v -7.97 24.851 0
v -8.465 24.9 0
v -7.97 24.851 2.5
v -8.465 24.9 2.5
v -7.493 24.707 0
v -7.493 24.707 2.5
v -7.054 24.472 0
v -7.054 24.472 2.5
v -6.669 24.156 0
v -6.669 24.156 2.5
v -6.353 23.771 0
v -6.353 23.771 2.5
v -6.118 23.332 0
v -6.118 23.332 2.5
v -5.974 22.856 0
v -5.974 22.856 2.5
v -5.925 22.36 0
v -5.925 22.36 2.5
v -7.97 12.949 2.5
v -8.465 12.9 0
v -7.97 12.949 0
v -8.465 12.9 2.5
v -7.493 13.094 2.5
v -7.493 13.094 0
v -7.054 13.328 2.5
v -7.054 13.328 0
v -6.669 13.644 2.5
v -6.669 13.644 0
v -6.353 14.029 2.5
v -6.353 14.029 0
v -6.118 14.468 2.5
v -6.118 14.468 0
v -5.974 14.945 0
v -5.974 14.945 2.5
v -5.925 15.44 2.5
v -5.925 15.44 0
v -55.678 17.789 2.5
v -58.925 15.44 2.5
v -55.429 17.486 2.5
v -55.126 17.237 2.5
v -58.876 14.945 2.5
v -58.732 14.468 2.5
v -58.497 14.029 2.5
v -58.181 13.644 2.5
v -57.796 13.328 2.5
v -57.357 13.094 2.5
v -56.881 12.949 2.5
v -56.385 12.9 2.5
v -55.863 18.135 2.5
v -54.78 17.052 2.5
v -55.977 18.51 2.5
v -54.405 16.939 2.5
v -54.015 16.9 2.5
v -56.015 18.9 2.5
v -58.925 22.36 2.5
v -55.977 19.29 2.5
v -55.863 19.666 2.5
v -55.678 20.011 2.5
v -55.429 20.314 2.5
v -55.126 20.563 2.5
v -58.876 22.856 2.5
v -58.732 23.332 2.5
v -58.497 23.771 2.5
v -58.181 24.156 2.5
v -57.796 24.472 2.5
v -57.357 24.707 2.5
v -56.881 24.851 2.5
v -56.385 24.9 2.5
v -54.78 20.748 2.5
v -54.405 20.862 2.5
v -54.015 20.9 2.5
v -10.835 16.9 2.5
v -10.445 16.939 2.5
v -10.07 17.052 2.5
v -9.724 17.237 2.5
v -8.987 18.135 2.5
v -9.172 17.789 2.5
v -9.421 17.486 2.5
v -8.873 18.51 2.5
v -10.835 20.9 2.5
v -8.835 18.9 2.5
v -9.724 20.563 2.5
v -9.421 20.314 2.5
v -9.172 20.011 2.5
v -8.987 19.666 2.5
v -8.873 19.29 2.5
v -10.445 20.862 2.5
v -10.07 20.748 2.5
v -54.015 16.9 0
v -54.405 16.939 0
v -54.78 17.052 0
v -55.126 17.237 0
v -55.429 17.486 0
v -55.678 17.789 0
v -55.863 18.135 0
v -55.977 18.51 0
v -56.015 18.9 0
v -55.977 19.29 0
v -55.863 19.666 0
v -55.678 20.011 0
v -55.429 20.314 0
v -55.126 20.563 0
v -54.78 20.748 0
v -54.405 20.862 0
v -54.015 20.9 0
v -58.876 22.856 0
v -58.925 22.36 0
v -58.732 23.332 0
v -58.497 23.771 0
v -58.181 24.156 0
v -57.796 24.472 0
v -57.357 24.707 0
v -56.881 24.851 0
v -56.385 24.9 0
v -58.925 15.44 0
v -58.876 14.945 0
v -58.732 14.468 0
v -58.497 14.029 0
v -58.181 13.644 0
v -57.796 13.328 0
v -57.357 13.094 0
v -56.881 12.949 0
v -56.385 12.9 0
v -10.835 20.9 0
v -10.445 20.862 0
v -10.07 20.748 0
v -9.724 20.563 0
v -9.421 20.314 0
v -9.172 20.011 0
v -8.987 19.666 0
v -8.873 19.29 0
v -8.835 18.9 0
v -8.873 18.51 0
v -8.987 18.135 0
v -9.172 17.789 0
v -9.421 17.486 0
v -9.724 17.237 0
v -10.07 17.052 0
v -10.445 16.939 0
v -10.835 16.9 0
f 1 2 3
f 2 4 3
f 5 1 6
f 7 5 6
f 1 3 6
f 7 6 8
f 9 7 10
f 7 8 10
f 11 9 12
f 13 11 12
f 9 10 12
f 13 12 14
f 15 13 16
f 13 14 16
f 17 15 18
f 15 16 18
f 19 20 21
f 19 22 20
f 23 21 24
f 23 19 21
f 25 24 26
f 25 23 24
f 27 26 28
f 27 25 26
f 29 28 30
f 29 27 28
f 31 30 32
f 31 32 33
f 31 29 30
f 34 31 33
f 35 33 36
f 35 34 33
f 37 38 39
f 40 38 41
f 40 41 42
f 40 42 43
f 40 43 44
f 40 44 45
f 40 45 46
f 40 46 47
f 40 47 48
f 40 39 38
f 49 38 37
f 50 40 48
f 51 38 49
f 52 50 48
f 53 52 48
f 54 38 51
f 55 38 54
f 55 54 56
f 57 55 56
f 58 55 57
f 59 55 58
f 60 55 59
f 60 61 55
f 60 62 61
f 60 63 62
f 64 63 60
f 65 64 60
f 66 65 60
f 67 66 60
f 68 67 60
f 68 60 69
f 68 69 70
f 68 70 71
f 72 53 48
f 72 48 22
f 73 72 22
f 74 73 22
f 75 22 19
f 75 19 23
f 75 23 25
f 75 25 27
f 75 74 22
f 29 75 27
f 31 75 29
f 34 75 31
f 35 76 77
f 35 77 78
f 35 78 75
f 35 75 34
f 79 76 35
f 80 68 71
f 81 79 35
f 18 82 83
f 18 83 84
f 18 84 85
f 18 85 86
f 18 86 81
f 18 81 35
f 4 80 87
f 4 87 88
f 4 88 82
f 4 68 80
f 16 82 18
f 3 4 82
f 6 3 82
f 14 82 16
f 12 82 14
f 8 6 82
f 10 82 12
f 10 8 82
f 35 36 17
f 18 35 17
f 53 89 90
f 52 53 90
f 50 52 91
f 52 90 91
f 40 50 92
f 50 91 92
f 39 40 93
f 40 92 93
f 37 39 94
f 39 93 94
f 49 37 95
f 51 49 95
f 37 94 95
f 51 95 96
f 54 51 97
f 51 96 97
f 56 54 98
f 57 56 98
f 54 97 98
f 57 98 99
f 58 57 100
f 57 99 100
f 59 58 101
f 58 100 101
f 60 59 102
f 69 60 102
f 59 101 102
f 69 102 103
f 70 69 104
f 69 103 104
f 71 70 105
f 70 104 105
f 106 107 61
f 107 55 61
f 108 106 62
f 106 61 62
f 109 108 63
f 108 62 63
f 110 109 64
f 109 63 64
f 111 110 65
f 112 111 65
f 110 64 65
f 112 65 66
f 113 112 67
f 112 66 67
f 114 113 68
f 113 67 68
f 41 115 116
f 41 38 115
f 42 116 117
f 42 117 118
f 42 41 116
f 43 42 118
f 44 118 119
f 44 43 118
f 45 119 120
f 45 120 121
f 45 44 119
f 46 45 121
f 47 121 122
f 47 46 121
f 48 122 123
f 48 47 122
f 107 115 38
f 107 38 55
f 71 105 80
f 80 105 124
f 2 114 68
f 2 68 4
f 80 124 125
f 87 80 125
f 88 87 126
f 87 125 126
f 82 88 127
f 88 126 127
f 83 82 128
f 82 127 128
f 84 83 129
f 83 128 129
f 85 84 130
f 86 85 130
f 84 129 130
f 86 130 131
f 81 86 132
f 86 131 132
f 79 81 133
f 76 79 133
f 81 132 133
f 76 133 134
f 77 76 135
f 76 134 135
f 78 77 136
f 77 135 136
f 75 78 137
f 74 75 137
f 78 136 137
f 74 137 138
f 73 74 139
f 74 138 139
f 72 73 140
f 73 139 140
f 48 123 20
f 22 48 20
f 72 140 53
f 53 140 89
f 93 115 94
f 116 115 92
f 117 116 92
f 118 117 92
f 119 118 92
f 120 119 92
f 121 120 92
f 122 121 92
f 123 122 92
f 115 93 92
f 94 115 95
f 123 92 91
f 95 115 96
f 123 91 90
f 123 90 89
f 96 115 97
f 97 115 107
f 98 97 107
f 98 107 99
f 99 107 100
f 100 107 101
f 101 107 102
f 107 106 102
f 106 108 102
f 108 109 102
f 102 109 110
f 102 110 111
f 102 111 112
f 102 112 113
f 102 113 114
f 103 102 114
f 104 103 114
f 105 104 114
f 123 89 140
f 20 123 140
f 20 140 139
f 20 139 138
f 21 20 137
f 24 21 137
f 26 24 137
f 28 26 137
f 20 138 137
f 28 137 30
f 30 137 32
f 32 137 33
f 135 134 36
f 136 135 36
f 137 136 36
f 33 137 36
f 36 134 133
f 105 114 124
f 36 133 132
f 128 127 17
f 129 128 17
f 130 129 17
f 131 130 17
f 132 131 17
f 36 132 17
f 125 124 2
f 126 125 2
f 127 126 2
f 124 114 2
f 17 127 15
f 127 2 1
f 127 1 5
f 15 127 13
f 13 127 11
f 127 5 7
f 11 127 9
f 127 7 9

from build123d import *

# Parameters (mm, degrees)
F0_W     = 53
F0_H     = 12
F1_DEPTH = 2.5
F2_R     = 2.54


with BuildPart() as f1:
    # F0 (on Top) → F1 (new body)
    with BuildSketch(Plane.XY):
        with Locations((-32.425053, 18.900206)):
            Rectangle(F0_W, F0_H)
        with BuildLine():
            Line((-54.015053, 20.900206), (-10.835053, 20.900206))
            ThreePointArc((-10.835053, 20.900206), (-8.835053, 18.900206), (-10.835053, 16.900206))
            Line((-10.835053, 16.900206), (-54.015053, 16.900206))
            ThreePointArc((-54.015053, 16.900206), (-56.015053, 18.900206), (-54.015053, 20.900206))
        make_face(mode=Mode.SUBTRACT)
    extrude(amount=F1_DEPTH)

    # F2
    f2_edges = [f1.edges().sort_by_distance(p)[0] for p in [
        (-58.925053, 24.900206, 1.25),
        (-58.925053, 12.900206, 1.25),
        (-5.925053, 12.900206, 1.25),
        (-5.925053, 24.900206, 1.25),
    ]]
    fillet(f2_edges, radius=F2_R)


solid = f1.part
